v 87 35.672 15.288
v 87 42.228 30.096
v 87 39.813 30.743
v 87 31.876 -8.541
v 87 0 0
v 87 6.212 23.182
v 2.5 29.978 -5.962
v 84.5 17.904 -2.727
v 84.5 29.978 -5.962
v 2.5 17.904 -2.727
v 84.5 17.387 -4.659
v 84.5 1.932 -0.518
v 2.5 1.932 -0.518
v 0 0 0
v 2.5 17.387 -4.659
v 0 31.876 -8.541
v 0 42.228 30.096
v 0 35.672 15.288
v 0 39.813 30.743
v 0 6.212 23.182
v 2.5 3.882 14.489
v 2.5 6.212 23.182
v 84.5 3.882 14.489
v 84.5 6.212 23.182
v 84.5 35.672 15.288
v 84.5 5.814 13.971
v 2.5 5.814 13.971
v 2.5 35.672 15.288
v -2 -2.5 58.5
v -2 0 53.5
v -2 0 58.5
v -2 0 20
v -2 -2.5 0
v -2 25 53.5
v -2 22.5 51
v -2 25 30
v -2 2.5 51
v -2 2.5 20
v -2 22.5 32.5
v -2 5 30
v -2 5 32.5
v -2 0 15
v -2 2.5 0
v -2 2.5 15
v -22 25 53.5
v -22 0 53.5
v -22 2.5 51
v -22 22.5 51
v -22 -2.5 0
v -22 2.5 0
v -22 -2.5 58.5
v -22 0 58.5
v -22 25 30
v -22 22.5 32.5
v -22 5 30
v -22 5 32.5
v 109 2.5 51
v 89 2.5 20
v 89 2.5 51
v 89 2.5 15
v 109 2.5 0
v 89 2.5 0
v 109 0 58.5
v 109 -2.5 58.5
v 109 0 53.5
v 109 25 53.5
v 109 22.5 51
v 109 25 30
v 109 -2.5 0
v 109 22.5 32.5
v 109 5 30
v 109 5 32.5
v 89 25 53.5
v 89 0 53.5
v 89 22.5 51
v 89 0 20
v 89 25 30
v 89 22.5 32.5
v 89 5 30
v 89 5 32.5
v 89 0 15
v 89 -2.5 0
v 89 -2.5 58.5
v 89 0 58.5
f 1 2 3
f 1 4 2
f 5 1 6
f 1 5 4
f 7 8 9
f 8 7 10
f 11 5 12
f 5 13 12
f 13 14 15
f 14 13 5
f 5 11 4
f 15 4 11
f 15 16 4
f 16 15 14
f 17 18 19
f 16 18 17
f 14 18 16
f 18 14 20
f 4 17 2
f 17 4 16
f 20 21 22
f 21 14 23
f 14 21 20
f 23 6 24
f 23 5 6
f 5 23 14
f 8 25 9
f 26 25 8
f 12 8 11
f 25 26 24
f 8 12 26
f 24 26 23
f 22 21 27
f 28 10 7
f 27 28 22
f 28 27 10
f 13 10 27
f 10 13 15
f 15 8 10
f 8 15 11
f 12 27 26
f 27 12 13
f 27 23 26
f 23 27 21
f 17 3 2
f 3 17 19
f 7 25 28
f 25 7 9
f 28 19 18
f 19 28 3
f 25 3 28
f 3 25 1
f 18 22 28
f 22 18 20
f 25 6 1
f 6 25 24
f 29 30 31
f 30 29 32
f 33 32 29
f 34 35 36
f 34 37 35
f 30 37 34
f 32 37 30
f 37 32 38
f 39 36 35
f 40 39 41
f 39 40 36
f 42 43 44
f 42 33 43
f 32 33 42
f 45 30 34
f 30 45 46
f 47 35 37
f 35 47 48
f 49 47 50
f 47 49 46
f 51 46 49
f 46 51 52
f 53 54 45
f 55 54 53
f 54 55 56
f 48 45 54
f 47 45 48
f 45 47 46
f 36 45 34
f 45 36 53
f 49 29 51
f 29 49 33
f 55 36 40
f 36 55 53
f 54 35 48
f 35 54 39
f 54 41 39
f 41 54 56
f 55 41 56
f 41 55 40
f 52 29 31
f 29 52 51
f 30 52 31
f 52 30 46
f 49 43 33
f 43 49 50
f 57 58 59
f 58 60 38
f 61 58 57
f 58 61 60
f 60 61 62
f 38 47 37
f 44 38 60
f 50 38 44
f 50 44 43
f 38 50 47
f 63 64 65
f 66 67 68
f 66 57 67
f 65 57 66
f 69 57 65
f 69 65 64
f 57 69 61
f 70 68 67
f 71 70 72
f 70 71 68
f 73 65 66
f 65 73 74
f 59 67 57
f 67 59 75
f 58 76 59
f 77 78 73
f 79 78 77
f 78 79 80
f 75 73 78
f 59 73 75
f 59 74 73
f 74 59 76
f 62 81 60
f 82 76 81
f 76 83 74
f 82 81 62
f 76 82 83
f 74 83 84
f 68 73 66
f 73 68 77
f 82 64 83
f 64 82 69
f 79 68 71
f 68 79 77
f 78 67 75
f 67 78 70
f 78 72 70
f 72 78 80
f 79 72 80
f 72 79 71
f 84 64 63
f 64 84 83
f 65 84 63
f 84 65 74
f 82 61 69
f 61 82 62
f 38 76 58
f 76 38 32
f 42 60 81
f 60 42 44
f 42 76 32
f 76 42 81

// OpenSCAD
// Under-Cabinet Tablet/Phone Holder for Kitchen Recipes — Parametric Design
// Pipeline Cycle 5 — 2026-03-16
// Supports: iPhone, iPad Mini, iPad, Samsung Galaxy Tab, Custom
// Mount: Under-cabinet hook clamp (no screws, no adhesive)
// Same hook-clamp pattern as Cycle 4 K-Cup holder

/* [Device Preset] */
// Device type selection
device_preset = "iPhone"; // ["iPhone", "iPadMini", "iPad", "GalaxyTab", "Custom"]

/* [Custom Device Dimensions (only used when device_preset = Custom)] */
custom_device_width = 78;   // mm — width of device (portrait orientation)
custom_device_depth = 10;   // mm — thickness of device (with case)

/* [Holder Configuration] */
device_clearance = 2.0;     // mm — clearance on each side of device slot
shelf_angle = 75;           // [60:5:90] degrees — viewing angle (90 = vertical, 60 = tilted back)
lip_height = 15;            // mm — front lip preventing device from sliding out
back_support_height = 40;   // mm — how tall the back support rises

/* [Cabinet Mount] */
cabinet_thickness = 18;     // [12:1:30] mm — thickness of cabinet shelf
hook_depth = 25;            // mm — how far the hook extends into the cabinet
hook_gap_tolerance = 0.5;   // mm — extra clearance in the hook slot
hook_lip = 5;               // mm — lip that grips the top of the shelf

/* [Structural] */
wall_thickness = 2.5;       // mm
base_thickness = 2.0;       // mm — thickness of the device shelf
mount_arm_width = 20;       // mm — width of each mounting arm
fillet_radius = 2.0;        // mm

/* [Advanced] */
$fn = 48;

// ============================================================
// Device Dimension Database
// ============================================================

// Device dimensions: [width_mm, depth_mm (with case), display_name]
// Width = the narrow dimension (portrait). Device sits in landscape for recipes.
// Depth = thickness including a typical case
function device_dims(preset) =
    preset == "iPhone"      ? [78, 12, "iPhone (with case)"] :
    preset == "iPadMini"    ? [135, 12, "iPad Mini (with case)"] :
    preset == "iPad"        ? [179, 12, "iPad 10th gen (with case)"] :
    preset == "GalaxyTab"   ? [165, 12, "Samsung Galaxy Tab S (with case)"] :
    // Custom fallback
    [custom_device_width, custom_device_depth, "Custom device"];

// Resolved device dimensions
_dev = device_dims(device_preset);
_dev_width = _dev[0];
_dev_depth = _dev[1];

// Slot dimensions
_slot_width = _dev_width + device_clearance * 2;
_slot_depth = _dev_depth + device_clearance * 2;

// Shelf dimensions
_shelf_width = _slot_width + wall_thickness * 2;
_shelf_depth = _slot_depth + base_thickness + lip_height;

// ============================================================
// Info Echo
// ============================================================

echo("=== Under-Cabinet Tablet/Phone Holder Configuration ===");
echo(str("Device preset: ", device_preset));
echo(str("Device width: ", _dev_width, "mm"));
echo(str("Device depth (with case): ", _dev_depth, "mm"));
echo(str("Slot width: ", _slot_width, "mm"));
echo(str("Shelf width: ", _shelf_width, "mm"));
echo(str("Shelf angle: ", shelf_angle, " degrees"));
echo(str("Cabinet thickness: ", cabinet_thickness, "mm"));

// ============================================================
// Modules
// ============================================================

// Under-cabinet hook clamp — reused pattern from K-Cup holder (Cycle 4)
module cabinet_hook(width) {
    _hook_slot = cabinet_thickness + hook_gap_tolerance;
    _hook_total_height = _hook_slot + wall_thickness * 2;
    _hook_total_depth = hook_depth + wall_thickness;

    difference() {
        union() {
            // Top plate (sits on top of shelf)
            translate([0, 0, _hook_slot + wall_thickness])
                cube([width, _hook_total_depth, wall_thickness]);

            // Back wall (connects top and bottom)
            translate([0, _hook_total_depth - wall_thickness, 0])
                cube([width, wall_thickness, _hook_total_height]);

            // Bottom plate (goes under the shelf)
            translate([0, hook_depth * 0.3, 0])
                cube([width, _hook_total_depth - hook_depth * 0.3, wall_thickness]);

            // Front lip (prevents sliding off)
            translate([0, 0, _hook_slot + wall_thickness])
                cube([width, wall_thickness, wall_thickness + hook_lip]);
        }

        // Internal slot for cabinet shelf
        translate([-0.01, -0.01, wall_thickness])
            cube([width + 0.02, _hook_total_depth - wall_thickness + 0.01, _hook_slot]);
    }
}

// The angled device shelf
module device_shelf() {
    // Shelf base — angled platform where the device rests
    difference() {
        cube([_shelf_width, _shelf_depth, base_thickness]);

        // Device slot — a groove for the device bottom edge
        translate([wall_thickness, base_thickness, -0.01])
            cube([_slot_width, _slot_depth, base_thickness + 0.02]);
    }

    // Front lip — prevents device from sliding off the shelf
    translate([0, 0, 0])
        cube([_shelf_width, base_thickness, lip_height]);

    // Back support — keeps device upright at the set angle
    translate([0, _shelf_depth - wall_thickness, 0])
        cube([_shelf_width, wall_thickness, back_support_height]);

    // Side walls for device guidance
    // Left wall
    cube([wall_thickness, _shelf_depth, back_support_height * 0.6]);
    // Right wall
    translate([_shelf_width - wall_thickness, 0, 0])
        cube([wall_thickness, _shelf_depth, back_support_height * 0.6]);
}

// Mounting arm — connects hook clamp to angled shelf
module mount_arm() {
    _hook_height = cabinet_thickness + hook_gap_tolerance + wall_thickness * 2;
    _arm_length = 30; // mm — distance shelf hangs below cabinet

    // Vertical arm from hook down to shelf
    cube([mount_arm_width, wall_thickness * 2, _hook_height + _arm_length]);

    // Hook at the top
    translate([0, 0, _arm_length])
        cabinet_hook(mount_arm_width);
}

// ============================================================
// Assembly
// ============================================================

module complete_holder() {
    _hook_height = cabinet_thickness + hook_gap_tolerance + wall_thickness * 2;
    _arm_drop = 30; // how far below cabinet the shelf hangs

    // Angled device shelf
    rotate([-(90 - shelf_angle), 0, 0])
        device_shelf();

    // Left mounting arm
    translate([-mount_arm_width - 2, -wall_thickness, 0])
        mount_arm();

    // Right mounting arm
    translate([_shelf_width + 2, -wall_thickness, 0])
        mount_arm();

    // Cross brace connecting arms behind the shelf (rigidity)
    _brace_z = _arm_drop * 0.5;
    translate([-mount_arm_width - 2, 0, _brace_z])
        cube([_shelf_width + mount_arm_width * 2 + 4, wall_thickness, wall_thickness * 2]);
}

// Render the complete holder
complete_holder();

// ============================================================
// Print Notes
// ============================================================
// This design prints in 2-3 parts for larger devices:
//
// OPTION A (Small devices — phone):
//   Print as one piece, shelf flat on build plate, arms pointing up.
//   May need supports for the hook geometry.
//
// OPTION B (Large devices — iPad):
//   Print shelf and arms separately, join with M3 bolts or friction fit.
//   Shelf prints flat. Each arm prints vertically.
//
// For the STL bundle, we provide both single-piece and multi-part versions.
//
// Material: PETG recommended (kitchen steam/splash resistance)
// Infill: 30% for arms (structural), 20% for shelf
// Layer height: 0.2mm
